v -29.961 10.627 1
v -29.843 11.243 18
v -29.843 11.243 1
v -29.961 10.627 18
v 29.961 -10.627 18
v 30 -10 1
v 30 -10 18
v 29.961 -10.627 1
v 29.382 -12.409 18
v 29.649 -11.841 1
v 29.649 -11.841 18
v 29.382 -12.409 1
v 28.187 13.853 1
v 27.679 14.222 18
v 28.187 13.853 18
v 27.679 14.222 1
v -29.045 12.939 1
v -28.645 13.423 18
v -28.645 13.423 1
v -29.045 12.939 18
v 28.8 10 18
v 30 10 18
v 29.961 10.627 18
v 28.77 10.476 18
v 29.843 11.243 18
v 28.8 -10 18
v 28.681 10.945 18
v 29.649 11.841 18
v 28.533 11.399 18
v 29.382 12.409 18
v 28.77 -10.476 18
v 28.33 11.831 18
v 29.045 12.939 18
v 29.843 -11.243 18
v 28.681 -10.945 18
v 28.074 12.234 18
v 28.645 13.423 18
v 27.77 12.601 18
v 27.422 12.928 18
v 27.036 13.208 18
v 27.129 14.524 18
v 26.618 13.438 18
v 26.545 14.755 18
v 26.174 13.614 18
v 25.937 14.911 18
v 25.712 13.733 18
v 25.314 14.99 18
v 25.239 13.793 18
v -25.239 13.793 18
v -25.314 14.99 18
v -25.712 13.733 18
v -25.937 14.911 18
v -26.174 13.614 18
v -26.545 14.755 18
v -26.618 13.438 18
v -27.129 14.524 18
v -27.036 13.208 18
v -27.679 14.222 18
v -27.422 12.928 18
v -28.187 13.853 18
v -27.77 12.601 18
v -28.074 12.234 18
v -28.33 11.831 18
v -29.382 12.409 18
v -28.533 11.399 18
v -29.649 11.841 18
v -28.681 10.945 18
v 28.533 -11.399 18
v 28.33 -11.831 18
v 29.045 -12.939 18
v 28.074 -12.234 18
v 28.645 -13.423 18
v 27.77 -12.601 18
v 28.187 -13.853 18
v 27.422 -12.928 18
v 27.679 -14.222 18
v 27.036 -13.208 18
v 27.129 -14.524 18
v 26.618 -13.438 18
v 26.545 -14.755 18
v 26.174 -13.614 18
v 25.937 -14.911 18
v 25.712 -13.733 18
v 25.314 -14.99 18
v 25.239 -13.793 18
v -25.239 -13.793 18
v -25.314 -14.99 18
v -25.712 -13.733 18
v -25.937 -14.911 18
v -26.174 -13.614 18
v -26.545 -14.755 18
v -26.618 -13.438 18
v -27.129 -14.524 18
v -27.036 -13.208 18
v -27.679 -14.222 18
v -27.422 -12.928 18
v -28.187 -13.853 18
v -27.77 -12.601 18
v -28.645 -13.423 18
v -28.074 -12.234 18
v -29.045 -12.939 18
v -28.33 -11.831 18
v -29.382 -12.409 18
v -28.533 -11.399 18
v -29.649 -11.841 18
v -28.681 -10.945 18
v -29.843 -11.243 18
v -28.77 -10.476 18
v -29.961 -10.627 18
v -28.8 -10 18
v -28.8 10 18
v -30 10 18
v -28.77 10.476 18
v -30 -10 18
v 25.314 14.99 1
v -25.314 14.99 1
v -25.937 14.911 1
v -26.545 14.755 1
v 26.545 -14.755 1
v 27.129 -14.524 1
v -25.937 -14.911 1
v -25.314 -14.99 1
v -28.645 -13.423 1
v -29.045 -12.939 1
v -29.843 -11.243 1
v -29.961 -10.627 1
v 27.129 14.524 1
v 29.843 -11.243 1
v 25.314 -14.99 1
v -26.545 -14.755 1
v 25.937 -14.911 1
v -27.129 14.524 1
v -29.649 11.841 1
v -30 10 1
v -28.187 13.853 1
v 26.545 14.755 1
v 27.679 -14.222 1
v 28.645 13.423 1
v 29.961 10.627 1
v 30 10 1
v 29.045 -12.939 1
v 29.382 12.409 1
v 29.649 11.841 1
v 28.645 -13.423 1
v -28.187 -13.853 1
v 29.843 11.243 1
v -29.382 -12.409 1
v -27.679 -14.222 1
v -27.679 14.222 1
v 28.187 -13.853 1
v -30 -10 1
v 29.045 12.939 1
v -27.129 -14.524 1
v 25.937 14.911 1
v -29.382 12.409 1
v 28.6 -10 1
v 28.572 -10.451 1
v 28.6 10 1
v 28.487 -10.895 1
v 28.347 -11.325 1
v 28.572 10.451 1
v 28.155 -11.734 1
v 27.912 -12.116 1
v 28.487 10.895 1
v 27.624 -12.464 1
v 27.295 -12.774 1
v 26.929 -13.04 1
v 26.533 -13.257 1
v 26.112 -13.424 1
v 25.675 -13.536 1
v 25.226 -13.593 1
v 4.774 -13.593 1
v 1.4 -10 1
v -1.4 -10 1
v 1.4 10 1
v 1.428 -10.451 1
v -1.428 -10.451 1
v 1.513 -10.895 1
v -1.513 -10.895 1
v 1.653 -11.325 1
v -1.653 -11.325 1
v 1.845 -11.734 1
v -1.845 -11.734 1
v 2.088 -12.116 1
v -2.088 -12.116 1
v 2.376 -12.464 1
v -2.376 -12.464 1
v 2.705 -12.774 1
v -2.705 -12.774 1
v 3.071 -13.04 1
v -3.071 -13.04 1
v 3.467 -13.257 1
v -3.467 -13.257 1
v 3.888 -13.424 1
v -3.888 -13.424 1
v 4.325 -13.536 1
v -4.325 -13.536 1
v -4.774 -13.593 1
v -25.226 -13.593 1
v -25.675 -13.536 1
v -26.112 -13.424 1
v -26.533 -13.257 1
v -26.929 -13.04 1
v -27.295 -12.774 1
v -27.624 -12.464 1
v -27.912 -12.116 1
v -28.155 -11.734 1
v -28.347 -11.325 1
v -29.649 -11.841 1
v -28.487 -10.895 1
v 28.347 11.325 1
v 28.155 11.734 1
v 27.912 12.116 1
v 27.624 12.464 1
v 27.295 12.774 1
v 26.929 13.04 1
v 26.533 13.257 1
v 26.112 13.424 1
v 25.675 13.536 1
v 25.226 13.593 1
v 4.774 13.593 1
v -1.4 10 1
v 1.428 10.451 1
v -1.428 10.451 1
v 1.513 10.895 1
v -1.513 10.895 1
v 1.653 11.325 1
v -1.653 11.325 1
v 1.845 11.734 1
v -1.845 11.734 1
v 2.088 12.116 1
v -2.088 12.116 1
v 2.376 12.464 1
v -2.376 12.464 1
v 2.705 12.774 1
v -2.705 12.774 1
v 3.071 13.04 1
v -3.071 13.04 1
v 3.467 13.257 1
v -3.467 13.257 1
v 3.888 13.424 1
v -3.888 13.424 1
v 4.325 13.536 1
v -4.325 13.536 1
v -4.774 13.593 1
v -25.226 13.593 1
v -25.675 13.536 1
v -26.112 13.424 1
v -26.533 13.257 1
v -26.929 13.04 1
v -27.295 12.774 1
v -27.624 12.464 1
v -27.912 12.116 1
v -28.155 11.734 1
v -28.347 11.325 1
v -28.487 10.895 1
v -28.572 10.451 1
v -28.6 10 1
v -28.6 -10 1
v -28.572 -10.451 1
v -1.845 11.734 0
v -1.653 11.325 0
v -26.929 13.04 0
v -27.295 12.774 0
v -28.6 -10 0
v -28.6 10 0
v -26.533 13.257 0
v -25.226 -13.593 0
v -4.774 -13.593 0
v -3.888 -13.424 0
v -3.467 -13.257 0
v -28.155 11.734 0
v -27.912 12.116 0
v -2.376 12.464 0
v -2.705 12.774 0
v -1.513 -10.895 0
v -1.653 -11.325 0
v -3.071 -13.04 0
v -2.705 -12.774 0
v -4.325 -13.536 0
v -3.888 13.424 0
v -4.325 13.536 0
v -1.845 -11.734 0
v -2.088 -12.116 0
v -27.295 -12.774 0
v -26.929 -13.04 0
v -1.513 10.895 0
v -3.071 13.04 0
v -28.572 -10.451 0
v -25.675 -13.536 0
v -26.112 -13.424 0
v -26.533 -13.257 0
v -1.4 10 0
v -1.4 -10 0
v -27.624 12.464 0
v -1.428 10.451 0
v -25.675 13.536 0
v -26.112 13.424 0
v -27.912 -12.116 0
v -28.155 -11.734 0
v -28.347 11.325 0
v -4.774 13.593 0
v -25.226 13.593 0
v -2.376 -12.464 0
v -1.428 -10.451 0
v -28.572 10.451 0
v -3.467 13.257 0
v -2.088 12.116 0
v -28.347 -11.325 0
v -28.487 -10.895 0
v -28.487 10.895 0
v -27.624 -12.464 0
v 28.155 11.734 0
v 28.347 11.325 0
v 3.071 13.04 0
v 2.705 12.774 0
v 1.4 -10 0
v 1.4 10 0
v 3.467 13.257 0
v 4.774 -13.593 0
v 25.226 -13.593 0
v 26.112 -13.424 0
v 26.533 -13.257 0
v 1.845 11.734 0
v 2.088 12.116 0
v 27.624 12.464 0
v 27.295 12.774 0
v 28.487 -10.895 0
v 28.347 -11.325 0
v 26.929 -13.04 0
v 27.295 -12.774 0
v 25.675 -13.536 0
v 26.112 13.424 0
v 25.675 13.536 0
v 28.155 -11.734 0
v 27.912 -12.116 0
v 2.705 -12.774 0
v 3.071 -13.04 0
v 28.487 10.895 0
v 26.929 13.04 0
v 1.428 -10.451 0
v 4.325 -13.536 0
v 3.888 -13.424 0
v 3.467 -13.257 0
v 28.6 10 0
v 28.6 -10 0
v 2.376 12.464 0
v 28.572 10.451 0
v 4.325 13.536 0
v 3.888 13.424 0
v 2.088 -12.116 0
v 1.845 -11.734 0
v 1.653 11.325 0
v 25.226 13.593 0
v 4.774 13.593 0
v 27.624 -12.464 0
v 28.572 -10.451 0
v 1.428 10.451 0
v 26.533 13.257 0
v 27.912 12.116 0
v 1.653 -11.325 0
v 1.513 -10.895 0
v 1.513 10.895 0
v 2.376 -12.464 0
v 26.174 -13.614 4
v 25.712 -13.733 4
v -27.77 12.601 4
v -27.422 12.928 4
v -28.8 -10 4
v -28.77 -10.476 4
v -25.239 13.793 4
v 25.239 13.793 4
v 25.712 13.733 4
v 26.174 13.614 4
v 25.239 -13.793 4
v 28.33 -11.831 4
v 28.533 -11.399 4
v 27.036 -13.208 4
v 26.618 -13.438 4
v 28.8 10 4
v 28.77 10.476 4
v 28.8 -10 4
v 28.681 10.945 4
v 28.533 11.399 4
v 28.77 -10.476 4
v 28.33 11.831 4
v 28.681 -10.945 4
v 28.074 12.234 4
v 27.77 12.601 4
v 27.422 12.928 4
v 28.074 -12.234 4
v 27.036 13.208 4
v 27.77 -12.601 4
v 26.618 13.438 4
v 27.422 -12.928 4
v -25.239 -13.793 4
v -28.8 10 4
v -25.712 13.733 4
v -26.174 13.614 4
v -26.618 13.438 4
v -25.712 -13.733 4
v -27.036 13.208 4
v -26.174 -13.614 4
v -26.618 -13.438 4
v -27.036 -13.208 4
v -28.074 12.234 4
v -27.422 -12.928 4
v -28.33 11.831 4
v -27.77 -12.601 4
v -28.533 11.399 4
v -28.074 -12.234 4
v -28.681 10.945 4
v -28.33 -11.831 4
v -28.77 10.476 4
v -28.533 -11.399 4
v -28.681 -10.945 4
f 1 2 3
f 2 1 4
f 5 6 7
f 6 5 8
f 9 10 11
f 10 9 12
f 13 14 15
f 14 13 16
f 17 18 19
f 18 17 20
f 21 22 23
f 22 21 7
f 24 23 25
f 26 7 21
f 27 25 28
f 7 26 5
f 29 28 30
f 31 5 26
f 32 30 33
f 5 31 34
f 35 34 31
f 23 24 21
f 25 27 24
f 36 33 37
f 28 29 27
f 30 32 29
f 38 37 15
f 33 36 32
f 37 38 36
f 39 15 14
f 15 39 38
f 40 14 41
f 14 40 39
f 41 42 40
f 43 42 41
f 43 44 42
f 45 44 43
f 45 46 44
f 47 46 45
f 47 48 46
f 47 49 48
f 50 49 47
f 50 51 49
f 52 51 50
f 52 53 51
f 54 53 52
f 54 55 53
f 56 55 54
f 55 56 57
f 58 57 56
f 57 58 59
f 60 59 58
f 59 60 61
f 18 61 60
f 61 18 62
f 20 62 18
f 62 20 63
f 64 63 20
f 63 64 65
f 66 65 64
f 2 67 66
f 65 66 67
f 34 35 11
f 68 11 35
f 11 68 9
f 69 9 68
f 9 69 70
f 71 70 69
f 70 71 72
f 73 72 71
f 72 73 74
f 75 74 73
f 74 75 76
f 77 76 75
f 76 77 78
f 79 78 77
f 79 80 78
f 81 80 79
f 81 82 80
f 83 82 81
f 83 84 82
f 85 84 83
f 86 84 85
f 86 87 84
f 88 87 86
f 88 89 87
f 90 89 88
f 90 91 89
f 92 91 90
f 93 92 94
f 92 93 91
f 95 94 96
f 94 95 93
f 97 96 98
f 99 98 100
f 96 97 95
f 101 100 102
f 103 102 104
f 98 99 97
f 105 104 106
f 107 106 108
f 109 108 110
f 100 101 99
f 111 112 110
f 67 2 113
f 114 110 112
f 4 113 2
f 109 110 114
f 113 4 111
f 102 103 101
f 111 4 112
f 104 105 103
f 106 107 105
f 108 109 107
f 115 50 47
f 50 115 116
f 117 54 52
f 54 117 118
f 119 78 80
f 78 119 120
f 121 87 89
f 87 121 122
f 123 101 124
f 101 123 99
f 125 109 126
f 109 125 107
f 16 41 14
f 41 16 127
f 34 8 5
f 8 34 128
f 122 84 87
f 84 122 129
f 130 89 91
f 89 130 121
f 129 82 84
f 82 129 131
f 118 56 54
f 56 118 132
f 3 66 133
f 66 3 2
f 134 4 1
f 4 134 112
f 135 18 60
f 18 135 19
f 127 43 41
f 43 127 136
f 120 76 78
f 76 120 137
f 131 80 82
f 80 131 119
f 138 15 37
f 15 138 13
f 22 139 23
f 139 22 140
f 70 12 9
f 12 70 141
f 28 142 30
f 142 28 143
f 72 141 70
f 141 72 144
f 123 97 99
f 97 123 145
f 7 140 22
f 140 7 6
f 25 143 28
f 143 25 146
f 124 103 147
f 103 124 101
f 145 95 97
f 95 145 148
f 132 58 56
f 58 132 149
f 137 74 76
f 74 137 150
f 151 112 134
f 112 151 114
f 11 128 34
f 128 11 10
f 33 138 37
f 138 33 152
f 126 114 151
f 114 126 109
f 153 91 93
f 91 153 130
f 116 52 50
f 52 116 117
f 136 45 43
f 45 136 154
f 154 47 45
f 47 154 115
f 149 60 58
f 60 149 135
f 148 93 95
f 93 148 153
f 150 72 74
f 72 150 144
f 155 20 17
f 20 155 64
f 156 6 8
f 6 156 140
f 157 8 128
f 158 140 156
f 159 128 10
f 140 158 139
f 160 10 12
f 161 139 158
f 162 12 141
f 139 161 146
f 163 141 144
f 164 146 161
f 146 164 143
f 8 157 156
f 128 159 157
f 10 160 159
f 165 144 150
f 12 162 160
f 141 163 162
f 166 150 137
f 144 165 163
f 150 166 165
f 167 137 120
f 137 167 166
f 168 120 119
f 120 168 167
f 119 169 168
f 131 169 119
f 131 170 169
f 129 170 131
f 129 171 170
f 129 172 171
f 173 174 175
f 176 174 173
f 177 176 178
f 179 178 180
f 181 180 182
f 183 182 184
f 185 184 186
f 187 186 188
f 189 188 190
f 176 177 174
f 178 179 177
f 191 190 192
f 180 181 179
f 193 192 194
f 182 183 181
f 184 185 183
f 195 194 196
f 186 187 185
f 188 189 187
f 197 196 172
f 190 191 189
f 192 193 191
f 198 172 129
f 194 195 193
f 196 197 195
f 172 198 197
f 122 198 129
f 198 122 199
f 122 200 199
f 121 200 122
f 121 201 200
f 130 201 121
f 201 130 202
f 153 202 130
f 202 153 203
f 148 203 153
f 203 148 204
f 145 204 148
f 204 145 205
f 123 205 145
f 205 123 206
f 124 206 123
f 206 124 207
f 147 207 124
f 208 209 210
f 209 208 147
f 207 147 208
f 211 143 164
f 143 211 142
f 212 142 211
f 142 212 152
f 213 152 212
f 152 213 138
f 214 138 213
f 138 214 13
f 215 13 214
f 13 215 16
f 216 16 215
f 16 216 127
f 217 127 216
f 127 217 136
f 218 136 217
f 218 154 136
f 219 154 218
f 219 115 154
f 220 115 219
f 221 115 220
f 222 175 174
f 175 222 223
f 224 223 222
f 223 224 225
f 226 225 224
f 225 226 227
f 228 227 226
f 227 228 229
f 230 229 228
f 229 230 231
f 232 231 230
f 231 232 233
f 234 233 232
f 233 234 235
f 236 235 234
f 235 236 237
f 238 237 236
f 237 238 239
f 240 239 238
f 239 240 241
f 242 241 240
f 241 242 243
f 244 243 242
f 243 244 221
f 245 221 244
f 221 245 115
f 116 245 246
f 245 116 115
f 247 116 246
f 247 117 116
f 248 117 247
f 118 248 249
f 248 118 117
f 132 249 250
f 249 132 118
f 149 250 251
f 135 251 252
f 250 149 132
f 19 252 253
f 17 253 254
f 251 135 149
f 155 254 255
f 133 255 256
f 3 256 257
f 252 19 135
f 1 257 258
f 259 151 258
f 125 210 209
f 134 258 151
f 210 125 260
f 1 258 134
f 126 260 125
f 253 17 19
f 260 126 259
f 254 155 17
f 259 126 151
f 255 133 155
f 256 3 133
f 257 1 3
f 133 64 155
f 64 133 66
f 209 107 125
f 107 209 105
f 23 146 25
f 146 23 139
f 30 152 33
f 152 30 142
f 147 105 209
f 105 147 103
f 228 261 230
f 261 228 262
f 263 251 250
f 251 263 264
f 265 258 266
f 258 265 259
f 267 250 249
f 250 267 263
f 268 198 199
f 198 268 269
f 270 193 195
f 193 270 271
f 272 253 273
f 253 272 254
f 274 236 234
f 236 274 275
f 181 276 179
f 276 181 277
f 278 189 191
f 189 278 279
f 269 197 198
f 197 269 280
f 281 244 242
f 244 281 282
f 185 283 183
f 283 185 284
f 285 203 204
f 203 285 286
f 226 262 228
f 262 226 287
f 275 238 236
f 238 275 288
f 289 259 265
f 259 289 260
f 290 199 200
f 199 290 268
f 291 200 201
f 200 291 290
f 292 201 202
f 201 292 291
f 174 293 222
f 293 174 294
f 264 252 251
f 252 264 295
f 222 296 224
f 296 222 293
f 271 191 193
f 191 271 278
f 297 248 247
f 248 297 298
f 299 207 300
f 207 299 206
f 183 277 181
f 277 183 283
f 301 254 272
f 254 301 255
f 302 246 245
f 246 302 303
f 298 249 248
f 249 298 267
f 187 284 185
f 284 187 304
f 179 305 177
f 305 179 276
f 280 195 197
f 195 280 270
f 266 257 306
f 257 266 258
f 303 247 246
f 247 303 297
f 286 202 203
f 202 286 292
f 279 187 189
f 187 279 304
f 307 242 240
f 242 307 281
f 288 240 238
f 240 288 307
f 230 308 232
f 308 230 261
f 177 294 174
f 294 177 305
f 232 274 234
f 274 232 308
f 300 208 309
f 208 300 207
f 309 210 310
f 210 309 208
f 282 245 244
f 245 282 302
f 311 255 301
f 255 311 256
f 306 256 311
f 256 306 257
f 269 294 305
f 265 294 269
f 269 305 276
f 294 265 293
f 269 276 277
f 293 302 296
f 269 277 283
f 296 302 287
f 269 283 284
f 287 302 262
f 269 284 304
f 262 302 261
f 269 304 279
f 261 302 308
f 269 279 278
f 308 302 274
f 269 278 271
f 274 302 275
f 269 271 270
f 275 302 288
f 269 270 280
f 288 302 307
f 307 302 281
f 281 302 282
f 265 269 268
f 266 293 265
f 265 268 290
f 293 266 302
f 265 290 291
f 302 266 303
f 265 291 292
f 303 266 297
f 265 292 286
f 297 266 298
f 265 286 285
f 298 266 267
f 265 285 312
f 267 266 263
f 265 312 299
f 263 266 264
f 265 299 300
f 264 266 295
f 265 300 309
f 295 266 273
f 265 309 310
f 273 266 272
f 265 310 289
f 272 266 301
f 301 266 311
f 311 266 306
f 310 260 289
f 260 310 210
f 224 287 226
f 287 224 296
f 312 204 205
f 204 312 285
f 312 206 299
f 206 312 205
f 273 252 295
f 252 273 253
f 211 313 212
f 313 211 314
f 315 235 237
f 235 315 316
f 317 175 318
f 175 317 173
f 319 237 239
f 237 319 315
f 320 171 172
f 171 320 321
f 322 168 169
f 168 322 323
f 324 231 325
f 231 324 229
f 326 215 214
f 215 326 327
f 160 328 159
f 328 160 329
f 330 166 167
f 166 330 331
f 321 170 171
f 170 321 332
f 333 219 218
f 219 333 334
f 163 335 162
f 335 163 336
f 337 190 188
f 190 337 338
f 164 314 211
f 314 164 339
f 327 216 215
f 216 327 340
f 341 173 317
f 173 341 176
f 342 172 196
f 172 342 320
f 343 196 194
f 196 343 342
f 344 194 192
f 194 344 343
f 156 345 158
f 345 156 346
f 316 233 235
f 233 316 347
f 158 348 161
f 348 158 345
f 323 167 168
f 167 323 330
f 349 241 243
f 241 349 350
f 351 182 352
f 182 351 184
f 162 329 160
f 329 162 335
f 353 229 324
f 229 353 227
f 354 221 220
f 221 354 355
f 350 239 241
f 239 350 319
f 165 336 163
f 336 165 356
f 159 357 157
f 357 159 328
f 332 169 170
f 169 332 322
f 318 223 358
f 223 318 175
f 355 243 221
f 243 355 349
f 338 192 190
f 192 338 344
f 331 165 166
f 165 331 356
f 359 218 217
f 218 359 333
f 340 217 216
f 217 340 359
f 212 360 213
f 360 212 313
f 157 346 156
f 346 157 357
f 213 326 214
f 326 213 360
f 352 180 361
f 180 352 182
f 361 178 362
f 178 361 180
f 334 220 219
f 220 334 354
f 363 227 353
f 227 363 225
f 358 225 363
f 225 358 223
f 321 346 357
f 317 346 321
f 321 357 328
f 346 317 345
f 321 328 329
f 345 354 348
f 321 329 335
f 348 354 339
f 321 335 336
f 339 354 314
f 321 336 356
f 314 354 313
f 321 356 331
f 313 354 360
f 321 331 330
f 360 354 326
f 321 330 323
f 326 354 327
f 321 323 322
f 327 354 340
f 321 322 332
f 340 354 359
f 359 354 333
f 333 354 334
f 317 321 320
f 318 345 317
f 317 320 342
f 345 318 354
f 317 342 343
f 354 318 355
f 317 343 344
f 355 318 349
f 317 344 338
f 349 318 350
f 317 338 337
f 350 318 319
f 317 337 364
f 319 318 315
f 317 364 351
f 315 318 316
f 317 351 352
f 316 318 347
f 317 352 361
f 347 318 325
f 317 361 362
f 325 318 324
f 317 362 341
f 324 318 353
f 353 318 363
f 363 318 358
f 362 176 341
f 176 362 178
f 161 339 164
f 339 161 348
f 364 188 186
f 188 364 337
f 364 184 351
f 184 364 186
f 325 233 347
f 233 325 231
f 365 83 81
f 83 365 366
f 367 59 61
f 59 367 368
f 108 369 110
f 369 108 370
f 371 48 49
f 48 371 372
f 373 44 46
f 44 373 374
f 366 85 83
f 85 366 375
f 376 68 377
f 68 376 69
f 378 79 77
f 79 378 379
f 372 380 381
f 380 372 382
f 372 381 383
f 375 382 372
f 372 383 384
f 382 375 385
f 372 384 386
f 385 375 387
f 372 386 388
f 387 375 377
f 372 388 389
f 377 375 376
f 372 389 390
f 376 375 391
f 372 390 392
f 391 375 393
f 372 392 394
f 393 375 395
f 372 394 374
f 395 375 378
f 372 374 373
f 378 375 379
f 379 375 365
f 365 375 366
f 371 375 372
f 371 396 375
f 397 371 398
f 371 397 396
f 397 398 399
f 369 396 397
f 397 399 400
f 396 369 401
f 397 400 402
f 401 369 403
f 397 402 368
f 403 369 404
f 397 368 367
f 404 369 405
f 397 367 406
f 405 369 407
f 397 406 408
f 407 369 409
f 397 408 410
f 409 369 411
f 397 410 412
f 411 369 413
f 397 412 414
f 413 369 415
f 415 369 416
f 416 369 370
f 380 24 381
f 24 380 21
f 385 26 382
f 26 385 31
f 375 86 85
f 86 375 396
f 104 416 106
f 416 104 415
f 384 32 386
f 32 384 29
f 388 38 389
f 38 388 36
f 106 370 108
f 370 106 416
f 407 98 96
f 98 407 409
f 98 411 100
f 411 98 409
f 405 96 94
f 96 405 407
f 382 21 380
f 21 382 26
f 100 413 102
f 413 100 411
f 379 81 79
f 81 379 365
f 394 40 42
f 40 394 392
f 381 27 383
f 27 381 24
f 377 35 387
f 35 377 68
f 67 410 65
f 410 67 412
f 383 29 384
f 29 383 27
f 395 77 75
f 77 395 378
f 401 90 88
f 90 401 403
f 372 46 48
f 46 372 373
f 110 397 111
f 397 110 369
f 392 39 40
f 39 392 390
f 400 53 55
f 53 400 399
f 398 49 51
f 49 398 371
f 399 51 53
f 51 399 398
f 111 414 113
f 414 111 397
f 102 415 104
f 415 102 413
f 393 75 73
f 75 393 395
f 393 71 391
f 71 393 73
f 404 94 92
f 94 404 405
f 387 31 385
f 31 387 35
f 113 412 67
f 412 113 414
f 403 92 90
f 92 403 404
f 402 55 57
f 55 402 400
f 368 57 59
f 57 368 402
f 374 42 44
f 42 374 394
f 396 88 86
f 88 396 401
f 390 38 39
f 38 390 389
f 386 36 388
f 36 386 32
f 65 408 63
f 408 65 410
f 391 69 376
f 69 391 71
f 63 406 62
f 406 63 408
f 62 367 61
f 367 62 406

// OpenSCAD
$fn = 50;


difference() {
	union() {
		translate(v = [0, 0, 1]) {
			hull() {
				translate(v = [-25.0000000000, 10.0000000000, 0]) {
					cylinder(h = 17, r = 5);
				}
				translate(v = [25.0000000000, 10.0000000000, 0]) {
					cylinder(h = 17, r = 5);
				}
				translate(v = [-25.0000000000, -10.0000000000, 0]) {
					cylinder(h = 17, r = 5);
				}
				translate(v = [25.0000000000, -10.0000000000, 0]) {
					cylinder(h = 17, r = 5);
				}
			}
		}
		translate(v = [-15.0000000000, 0.0000000000, 11]) {
			rotate(a = [0, 180, 0]) {
				hull() {
					translate(v = [-10.0000000000, 10.0000000000, 0]) {
						cylinder(h = 11, r = 3.6000000000);
					}
					translate(v = [10.0000000000, 10.0000000000, 0]) {
						cylinder(h = 11, r = 3.6000000000);
					}
					translate(v = [-10.0000000000, -10.0000000000, 0]) {
						cylinder(h = 11, r = 3.6000000000);
					}
					translate(v = [10.0000000000, -10.0000000000, 0]) {
						cylinder(h = 11, r = 3.6000000000);
					}
				}
			}
		}
		translate(v = [-15.0000000000, 0.0000000000, 13]) {
			rotate(a = [0, 180, 0]) {
				hull() {
					translate(v = [-10.0000000000, 10.0000000000, 0]) {
						cylinder(h = 2, r = 3.6000000000);
					}
					translate(v = [10.0000000000, 10.0000000000, 0]) {
						cylinder(h = 2, r = 3.6000000000);
					}
					translate(v = [-10.0000000000, -10.0000000000, 0]) {
						cylinder(h = 2, r = 3.6000000000);
					}
					translate(v = [10.0000000000, -10.0000000000, 0]) {
						cylinder(h = 2, r = 3.6000000000);
					}
				}
			}
		}
		translate(v = [15.0000000000, 0.0000000000, 11]) {
			rotate(a = [0, 180, 0]) {
				hull() {
					translate(v = [-10.0000000000, 10.0000000000, 0]) {
						cylinder(h = 11, r = 3.6000000000);
					}
					translate(v = [10.0000000000, 10.0000000000, 0]) {
						cylinder(h = 11, r = 3.6000000000);
					}
					translate(v = [-10.0000000000, -10.0000000000, 0]) {
						cylinder(h = 11, r = 3.6000000000);
					}
					translate(v = [10.0000000000, -10.0000000000, 0]) {
						cylinder(h = 11, r = 3.6000000000);
					}
				}
			}
		}
		translate(v = [15.0000000000, 0.0000000000, 13]) {
			rotate(a = [0, 180, 0]) {
				hull() {
					translate(v = [-10.0000000000, 10.0000000000, 0]) {
						cylinder(h = 2, r = 3.6000000000);
					}
					translate(v = [10.0000000000, 10.0000000000, 0]) {
						cylinder(h = 2, r = 3.6000000000);
					}
					translate(v = [-10.0000000000, -10.0000000000, 0]) {
						cylinder(h = 2, r = 3.6000000000);
					}
					translate(v = [10.0000000000, -10.0000000000, 0]) {
						cylinder(h = 2, r = 3.6000000000);
					}
				}
			}
		}
	}
	union() {
		translate(v = [0, 0, 4]) {
			hull() {
				translate(v = [-25.0000000000, 10.0000000000, 0]) {
					cylinder(h = 14, r = 3.8000000000);
				}
				translate(v = [25.0000000000, 10.0000000000, 0]) {
					cylinder(h = 14, r = 3.8000000000);
				}
				translate(v = [-25.0000000000, -10.0000000000, 0]) {
					cylinder(h = 14, r = 3.8000000000);
				}
				translate(v = [25.0000000000, -10.0000000000, 0]) {
					cylinder(h = 14, r = 3.8000000000);
				}
			}
		}
		translate(v = [-15.0000000000, 0.0000000000, 14.5000000000]) {
			rotate(a = [0, 180, 0]) {
				hull() {
					translate(v = [-10.0000000000, 10.0000000000, 0]) {
						cylinder(h = 3.0000000000, r = 2.4000000000);
					}
					translate(v = [10.0000000000, 10.0000000000, 0]) {
						cylinder(h = 3.0000000000, r = 2.4000000000);
					}
					translate(v = [-10.0000000000, -10.0000000000, 0]) {
						cylinder(h = 3.0000000000, r = 2.4000000000);
					}
					translate(v = [10.0000000000, -10.0000000000, 0]) {
						cylinder(h = 3.0000000000, r = 2.4000000000);
					}
				}
			}
		}
		translate(v = [15.0000000000, 0.0000000000, 14.5000000000]) {
			rotate(a = [0, 180, 0]) {
				hull() {
					translate(v = [-10.0000000000, 10.0000000000, 0]) {
						cylinder(h = 3.0000000000, r = 2.4000000000);
					}
					translate(v = [10.0000000000, 10.0000000000, 0]) {
						cylinder(h = 3.0000000000, r = 2.4000000000);
					}
					translate(v = [-10.0000000000, -10.0000000000, 0]) {
						cylinder(h = 3.0000000000, r = 2.4000000000);
					}
					translate(v = [10.0000000000, -10.0000000000, 0]) {
						cylinder(h = 3.0000000000, r = 2.4000000000);
					}
				}
			}
		}
	}
}
